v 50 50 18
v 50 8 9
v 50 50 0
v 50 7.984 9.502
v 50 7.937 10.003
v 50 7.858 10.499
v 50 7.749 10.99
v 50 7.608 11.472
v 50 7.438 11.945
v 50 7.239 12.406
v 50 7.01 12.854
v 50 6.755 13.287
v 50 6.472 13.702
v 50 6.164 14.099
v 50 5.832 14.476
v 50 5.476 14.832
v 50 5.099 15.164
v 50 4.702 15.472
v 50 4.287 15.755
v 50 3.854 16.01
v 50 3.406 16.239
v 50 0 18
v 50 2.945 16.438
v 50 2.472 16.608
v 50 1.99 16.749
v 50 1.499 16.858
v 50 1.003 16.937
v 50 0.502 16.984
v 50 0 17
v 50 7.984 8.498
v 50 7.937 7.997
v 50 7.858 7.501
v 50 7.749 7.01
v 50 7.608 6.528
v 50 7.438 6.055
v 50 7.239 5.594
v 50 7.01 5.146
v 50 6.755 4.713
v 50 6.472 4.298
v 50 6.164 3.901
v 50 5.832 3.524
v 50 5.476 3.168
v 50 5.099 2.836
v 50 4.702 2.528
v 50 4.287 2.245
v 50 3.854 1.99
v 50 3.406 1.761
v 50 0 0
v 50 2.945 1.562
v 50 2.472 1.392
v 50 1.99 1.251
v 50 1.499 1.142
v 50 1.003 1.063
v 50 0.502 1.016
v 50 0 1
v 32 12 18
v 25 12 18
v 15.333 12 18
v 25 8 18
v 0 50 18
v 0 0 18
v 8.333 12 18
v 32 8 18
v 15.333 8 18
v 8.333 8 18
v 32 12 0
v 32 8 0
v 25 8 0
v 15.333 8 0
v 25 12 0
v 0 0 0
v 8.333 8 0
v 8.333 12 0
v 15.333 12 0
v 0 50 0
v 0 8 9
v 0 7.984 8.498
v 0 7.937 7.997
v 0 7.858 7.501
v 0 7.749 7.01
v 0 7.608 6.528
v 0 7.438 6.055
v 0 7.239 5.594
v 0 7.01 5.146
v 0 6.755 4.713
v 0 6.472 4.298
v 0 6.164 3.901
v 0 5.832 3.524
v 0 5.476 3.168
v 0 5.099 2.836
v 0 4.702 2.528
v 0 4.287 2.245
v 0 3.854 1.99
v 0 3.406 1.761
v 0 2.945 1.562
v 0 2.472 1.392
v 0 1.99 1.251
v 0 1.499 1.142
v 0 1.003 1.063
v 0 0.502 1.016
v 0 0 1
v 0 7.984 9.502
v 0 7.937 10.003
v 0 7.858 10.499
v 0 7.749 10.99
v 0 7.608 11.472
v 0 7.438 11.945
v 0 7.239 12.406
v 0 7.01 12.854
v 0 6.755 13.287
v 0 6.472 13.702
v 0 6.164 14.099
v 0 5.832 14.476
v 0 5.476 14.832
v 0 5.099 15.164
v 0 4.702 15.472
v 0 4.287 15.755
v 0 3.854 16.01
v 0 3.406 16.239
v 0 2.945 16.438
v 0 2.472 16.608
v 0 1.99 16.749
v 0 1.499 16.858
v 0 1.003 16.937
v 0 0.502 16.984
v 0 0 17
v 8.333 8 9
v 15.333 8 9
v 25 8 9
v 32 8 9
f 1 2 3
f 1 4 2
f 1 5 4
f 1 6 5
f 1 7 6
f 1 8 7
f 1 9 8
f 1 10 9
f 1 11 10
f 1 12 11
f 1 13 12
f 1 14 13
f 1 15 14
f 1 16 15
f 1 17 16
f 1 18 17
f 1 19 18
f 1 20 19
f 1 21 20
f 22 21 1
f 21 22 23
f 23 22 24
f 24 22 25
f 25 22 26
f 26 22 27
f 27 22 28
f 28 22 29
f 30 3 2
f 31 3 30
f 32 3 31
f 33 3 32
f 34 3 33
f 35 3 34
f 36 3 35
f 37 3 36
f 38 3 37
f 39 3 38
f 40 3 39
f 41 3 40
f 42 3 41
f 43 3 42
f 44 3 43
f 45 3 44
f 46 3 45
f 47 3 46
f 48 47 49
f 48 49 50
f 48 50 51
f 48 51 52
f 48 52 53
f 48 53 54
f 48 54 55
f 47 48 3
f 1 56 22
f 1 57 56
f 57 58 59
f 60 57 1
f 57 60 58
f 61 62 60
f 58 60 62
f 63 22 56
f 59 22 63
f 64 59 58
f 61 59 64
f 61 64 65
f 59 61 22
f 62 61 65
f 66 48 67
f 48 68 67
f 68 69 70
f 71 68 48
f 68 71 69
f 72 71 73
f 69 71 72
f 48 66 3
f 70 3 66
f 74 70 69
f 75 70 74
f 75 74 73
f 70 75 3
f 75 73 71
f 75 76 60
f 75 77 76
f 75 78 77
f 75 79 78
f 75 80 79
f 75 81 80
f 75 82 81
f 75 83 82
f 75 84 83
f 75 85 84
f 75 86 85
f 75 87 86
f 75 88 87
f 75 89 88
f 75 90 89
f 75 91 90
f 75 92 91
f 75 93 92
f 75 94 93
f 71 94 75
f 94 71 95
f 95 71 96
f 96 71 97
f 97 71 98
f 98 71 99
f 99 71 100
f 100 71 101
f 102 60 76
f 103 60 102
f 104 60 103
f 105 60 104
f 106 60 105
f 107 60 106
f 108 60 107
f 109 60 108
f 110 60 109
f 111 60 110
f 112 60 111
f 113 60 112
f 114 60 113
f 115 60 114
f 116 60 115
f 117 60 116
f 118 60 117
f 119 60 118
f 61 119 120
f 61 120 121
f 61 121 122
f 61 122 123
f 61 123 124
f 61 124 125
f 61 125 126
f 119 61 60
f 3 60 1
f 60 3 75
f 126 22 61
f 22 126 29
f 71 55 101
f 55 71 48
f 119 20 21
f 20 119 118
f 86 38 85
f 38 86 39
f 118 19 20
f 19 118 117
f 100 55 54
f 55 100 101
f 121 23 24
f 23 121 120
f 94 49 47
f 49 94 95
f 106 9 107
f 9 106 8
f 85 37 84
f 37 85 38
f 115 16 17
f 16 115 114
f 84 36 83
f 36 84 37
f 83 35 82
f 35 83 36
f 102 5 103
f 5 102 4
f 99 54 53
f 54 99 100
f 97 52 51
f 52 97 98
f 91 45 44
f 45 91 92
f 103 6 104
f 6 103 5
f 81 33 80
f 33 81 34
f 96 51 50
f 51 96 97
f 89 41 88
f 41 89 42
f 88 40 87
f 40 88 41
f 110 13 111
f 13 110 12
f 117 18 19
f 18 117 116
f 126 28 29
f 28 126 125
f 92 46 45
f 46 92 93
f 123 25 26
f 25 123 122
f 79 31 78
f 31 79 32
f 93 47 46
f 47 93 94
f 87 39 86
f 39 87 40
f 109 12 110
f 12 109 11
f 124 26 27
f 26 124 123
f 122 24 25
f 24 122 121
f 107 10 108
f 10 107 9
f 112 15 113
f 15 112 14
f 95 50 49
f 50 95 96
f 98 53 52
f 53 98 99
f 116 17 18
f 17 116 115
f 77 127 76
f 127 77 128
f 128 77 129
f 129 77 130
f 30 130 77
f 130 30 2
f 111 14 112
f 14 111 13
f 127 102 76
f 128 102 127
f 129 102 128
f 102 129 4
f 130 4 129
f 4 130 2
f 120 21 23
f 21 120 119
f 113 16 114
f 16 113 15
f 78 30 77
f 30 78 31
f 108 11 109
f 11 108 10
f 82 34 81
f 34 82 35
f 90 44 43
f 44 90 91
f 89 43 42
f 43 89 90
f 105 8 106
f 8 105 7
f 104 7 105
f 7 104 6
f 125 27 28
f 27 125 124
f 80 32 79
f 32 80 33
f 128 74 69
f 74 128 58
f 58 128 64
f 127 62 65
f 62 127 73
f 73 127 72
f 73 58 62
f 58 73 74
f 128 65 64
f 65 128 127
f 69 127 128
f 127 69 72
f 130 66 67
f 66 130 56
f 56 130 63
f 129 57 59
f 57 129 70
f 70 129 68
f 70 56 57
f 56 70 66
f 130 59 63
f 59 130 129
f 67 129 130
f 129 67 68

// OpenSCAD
poleSize=16;
blockHeavyness=2;
blockHeight=50;
blockDepth=50;
binderWidth=7;
binderHeight=4;
pinDiameter=20;
pinHeight=20;

$fn=100;

//Math
//witdh of the block
blockWidth=poleSize+blockHeavyness;
//length of line betewen right angle and middle of triangleside C
triHeightC=blockHeight*blockDepth/sqrt(blockHeight*blockHeight+blockDepth*blockDepth);


//holeTemplate
%rotate([0,90,0]){
    difference(){
        cylinder(d=pinDiameter,h=pinHeight);
        translate([0,0,-1]){
            cylinder(d=pinDiameter-2,h=pinHeight+2);
        }
    }
}


difference(){
    //MainBlock
    rotate([0,0,0]){
        cube([blockHeight,blockDepth,blockWidth]);
        
    }
        //pole
    translate([-2,0,blockWidth/2]){
        rotate([0,90,0]){
            cylinder(d=poleSize,h=blockHeight+4);
        }
    }
    //strpiBlock1
    translate([blockHeight/6,poleSize/2,-1]){
        cube([binderWidth,binderHeight,blockWidth+2]);
    }
    //strpiBlock2
    translate([blockHeight/6*3,poleSize/2,-1]){
        cube([binderWidth,binderHeight,blockWidth+2]);
    }
}
